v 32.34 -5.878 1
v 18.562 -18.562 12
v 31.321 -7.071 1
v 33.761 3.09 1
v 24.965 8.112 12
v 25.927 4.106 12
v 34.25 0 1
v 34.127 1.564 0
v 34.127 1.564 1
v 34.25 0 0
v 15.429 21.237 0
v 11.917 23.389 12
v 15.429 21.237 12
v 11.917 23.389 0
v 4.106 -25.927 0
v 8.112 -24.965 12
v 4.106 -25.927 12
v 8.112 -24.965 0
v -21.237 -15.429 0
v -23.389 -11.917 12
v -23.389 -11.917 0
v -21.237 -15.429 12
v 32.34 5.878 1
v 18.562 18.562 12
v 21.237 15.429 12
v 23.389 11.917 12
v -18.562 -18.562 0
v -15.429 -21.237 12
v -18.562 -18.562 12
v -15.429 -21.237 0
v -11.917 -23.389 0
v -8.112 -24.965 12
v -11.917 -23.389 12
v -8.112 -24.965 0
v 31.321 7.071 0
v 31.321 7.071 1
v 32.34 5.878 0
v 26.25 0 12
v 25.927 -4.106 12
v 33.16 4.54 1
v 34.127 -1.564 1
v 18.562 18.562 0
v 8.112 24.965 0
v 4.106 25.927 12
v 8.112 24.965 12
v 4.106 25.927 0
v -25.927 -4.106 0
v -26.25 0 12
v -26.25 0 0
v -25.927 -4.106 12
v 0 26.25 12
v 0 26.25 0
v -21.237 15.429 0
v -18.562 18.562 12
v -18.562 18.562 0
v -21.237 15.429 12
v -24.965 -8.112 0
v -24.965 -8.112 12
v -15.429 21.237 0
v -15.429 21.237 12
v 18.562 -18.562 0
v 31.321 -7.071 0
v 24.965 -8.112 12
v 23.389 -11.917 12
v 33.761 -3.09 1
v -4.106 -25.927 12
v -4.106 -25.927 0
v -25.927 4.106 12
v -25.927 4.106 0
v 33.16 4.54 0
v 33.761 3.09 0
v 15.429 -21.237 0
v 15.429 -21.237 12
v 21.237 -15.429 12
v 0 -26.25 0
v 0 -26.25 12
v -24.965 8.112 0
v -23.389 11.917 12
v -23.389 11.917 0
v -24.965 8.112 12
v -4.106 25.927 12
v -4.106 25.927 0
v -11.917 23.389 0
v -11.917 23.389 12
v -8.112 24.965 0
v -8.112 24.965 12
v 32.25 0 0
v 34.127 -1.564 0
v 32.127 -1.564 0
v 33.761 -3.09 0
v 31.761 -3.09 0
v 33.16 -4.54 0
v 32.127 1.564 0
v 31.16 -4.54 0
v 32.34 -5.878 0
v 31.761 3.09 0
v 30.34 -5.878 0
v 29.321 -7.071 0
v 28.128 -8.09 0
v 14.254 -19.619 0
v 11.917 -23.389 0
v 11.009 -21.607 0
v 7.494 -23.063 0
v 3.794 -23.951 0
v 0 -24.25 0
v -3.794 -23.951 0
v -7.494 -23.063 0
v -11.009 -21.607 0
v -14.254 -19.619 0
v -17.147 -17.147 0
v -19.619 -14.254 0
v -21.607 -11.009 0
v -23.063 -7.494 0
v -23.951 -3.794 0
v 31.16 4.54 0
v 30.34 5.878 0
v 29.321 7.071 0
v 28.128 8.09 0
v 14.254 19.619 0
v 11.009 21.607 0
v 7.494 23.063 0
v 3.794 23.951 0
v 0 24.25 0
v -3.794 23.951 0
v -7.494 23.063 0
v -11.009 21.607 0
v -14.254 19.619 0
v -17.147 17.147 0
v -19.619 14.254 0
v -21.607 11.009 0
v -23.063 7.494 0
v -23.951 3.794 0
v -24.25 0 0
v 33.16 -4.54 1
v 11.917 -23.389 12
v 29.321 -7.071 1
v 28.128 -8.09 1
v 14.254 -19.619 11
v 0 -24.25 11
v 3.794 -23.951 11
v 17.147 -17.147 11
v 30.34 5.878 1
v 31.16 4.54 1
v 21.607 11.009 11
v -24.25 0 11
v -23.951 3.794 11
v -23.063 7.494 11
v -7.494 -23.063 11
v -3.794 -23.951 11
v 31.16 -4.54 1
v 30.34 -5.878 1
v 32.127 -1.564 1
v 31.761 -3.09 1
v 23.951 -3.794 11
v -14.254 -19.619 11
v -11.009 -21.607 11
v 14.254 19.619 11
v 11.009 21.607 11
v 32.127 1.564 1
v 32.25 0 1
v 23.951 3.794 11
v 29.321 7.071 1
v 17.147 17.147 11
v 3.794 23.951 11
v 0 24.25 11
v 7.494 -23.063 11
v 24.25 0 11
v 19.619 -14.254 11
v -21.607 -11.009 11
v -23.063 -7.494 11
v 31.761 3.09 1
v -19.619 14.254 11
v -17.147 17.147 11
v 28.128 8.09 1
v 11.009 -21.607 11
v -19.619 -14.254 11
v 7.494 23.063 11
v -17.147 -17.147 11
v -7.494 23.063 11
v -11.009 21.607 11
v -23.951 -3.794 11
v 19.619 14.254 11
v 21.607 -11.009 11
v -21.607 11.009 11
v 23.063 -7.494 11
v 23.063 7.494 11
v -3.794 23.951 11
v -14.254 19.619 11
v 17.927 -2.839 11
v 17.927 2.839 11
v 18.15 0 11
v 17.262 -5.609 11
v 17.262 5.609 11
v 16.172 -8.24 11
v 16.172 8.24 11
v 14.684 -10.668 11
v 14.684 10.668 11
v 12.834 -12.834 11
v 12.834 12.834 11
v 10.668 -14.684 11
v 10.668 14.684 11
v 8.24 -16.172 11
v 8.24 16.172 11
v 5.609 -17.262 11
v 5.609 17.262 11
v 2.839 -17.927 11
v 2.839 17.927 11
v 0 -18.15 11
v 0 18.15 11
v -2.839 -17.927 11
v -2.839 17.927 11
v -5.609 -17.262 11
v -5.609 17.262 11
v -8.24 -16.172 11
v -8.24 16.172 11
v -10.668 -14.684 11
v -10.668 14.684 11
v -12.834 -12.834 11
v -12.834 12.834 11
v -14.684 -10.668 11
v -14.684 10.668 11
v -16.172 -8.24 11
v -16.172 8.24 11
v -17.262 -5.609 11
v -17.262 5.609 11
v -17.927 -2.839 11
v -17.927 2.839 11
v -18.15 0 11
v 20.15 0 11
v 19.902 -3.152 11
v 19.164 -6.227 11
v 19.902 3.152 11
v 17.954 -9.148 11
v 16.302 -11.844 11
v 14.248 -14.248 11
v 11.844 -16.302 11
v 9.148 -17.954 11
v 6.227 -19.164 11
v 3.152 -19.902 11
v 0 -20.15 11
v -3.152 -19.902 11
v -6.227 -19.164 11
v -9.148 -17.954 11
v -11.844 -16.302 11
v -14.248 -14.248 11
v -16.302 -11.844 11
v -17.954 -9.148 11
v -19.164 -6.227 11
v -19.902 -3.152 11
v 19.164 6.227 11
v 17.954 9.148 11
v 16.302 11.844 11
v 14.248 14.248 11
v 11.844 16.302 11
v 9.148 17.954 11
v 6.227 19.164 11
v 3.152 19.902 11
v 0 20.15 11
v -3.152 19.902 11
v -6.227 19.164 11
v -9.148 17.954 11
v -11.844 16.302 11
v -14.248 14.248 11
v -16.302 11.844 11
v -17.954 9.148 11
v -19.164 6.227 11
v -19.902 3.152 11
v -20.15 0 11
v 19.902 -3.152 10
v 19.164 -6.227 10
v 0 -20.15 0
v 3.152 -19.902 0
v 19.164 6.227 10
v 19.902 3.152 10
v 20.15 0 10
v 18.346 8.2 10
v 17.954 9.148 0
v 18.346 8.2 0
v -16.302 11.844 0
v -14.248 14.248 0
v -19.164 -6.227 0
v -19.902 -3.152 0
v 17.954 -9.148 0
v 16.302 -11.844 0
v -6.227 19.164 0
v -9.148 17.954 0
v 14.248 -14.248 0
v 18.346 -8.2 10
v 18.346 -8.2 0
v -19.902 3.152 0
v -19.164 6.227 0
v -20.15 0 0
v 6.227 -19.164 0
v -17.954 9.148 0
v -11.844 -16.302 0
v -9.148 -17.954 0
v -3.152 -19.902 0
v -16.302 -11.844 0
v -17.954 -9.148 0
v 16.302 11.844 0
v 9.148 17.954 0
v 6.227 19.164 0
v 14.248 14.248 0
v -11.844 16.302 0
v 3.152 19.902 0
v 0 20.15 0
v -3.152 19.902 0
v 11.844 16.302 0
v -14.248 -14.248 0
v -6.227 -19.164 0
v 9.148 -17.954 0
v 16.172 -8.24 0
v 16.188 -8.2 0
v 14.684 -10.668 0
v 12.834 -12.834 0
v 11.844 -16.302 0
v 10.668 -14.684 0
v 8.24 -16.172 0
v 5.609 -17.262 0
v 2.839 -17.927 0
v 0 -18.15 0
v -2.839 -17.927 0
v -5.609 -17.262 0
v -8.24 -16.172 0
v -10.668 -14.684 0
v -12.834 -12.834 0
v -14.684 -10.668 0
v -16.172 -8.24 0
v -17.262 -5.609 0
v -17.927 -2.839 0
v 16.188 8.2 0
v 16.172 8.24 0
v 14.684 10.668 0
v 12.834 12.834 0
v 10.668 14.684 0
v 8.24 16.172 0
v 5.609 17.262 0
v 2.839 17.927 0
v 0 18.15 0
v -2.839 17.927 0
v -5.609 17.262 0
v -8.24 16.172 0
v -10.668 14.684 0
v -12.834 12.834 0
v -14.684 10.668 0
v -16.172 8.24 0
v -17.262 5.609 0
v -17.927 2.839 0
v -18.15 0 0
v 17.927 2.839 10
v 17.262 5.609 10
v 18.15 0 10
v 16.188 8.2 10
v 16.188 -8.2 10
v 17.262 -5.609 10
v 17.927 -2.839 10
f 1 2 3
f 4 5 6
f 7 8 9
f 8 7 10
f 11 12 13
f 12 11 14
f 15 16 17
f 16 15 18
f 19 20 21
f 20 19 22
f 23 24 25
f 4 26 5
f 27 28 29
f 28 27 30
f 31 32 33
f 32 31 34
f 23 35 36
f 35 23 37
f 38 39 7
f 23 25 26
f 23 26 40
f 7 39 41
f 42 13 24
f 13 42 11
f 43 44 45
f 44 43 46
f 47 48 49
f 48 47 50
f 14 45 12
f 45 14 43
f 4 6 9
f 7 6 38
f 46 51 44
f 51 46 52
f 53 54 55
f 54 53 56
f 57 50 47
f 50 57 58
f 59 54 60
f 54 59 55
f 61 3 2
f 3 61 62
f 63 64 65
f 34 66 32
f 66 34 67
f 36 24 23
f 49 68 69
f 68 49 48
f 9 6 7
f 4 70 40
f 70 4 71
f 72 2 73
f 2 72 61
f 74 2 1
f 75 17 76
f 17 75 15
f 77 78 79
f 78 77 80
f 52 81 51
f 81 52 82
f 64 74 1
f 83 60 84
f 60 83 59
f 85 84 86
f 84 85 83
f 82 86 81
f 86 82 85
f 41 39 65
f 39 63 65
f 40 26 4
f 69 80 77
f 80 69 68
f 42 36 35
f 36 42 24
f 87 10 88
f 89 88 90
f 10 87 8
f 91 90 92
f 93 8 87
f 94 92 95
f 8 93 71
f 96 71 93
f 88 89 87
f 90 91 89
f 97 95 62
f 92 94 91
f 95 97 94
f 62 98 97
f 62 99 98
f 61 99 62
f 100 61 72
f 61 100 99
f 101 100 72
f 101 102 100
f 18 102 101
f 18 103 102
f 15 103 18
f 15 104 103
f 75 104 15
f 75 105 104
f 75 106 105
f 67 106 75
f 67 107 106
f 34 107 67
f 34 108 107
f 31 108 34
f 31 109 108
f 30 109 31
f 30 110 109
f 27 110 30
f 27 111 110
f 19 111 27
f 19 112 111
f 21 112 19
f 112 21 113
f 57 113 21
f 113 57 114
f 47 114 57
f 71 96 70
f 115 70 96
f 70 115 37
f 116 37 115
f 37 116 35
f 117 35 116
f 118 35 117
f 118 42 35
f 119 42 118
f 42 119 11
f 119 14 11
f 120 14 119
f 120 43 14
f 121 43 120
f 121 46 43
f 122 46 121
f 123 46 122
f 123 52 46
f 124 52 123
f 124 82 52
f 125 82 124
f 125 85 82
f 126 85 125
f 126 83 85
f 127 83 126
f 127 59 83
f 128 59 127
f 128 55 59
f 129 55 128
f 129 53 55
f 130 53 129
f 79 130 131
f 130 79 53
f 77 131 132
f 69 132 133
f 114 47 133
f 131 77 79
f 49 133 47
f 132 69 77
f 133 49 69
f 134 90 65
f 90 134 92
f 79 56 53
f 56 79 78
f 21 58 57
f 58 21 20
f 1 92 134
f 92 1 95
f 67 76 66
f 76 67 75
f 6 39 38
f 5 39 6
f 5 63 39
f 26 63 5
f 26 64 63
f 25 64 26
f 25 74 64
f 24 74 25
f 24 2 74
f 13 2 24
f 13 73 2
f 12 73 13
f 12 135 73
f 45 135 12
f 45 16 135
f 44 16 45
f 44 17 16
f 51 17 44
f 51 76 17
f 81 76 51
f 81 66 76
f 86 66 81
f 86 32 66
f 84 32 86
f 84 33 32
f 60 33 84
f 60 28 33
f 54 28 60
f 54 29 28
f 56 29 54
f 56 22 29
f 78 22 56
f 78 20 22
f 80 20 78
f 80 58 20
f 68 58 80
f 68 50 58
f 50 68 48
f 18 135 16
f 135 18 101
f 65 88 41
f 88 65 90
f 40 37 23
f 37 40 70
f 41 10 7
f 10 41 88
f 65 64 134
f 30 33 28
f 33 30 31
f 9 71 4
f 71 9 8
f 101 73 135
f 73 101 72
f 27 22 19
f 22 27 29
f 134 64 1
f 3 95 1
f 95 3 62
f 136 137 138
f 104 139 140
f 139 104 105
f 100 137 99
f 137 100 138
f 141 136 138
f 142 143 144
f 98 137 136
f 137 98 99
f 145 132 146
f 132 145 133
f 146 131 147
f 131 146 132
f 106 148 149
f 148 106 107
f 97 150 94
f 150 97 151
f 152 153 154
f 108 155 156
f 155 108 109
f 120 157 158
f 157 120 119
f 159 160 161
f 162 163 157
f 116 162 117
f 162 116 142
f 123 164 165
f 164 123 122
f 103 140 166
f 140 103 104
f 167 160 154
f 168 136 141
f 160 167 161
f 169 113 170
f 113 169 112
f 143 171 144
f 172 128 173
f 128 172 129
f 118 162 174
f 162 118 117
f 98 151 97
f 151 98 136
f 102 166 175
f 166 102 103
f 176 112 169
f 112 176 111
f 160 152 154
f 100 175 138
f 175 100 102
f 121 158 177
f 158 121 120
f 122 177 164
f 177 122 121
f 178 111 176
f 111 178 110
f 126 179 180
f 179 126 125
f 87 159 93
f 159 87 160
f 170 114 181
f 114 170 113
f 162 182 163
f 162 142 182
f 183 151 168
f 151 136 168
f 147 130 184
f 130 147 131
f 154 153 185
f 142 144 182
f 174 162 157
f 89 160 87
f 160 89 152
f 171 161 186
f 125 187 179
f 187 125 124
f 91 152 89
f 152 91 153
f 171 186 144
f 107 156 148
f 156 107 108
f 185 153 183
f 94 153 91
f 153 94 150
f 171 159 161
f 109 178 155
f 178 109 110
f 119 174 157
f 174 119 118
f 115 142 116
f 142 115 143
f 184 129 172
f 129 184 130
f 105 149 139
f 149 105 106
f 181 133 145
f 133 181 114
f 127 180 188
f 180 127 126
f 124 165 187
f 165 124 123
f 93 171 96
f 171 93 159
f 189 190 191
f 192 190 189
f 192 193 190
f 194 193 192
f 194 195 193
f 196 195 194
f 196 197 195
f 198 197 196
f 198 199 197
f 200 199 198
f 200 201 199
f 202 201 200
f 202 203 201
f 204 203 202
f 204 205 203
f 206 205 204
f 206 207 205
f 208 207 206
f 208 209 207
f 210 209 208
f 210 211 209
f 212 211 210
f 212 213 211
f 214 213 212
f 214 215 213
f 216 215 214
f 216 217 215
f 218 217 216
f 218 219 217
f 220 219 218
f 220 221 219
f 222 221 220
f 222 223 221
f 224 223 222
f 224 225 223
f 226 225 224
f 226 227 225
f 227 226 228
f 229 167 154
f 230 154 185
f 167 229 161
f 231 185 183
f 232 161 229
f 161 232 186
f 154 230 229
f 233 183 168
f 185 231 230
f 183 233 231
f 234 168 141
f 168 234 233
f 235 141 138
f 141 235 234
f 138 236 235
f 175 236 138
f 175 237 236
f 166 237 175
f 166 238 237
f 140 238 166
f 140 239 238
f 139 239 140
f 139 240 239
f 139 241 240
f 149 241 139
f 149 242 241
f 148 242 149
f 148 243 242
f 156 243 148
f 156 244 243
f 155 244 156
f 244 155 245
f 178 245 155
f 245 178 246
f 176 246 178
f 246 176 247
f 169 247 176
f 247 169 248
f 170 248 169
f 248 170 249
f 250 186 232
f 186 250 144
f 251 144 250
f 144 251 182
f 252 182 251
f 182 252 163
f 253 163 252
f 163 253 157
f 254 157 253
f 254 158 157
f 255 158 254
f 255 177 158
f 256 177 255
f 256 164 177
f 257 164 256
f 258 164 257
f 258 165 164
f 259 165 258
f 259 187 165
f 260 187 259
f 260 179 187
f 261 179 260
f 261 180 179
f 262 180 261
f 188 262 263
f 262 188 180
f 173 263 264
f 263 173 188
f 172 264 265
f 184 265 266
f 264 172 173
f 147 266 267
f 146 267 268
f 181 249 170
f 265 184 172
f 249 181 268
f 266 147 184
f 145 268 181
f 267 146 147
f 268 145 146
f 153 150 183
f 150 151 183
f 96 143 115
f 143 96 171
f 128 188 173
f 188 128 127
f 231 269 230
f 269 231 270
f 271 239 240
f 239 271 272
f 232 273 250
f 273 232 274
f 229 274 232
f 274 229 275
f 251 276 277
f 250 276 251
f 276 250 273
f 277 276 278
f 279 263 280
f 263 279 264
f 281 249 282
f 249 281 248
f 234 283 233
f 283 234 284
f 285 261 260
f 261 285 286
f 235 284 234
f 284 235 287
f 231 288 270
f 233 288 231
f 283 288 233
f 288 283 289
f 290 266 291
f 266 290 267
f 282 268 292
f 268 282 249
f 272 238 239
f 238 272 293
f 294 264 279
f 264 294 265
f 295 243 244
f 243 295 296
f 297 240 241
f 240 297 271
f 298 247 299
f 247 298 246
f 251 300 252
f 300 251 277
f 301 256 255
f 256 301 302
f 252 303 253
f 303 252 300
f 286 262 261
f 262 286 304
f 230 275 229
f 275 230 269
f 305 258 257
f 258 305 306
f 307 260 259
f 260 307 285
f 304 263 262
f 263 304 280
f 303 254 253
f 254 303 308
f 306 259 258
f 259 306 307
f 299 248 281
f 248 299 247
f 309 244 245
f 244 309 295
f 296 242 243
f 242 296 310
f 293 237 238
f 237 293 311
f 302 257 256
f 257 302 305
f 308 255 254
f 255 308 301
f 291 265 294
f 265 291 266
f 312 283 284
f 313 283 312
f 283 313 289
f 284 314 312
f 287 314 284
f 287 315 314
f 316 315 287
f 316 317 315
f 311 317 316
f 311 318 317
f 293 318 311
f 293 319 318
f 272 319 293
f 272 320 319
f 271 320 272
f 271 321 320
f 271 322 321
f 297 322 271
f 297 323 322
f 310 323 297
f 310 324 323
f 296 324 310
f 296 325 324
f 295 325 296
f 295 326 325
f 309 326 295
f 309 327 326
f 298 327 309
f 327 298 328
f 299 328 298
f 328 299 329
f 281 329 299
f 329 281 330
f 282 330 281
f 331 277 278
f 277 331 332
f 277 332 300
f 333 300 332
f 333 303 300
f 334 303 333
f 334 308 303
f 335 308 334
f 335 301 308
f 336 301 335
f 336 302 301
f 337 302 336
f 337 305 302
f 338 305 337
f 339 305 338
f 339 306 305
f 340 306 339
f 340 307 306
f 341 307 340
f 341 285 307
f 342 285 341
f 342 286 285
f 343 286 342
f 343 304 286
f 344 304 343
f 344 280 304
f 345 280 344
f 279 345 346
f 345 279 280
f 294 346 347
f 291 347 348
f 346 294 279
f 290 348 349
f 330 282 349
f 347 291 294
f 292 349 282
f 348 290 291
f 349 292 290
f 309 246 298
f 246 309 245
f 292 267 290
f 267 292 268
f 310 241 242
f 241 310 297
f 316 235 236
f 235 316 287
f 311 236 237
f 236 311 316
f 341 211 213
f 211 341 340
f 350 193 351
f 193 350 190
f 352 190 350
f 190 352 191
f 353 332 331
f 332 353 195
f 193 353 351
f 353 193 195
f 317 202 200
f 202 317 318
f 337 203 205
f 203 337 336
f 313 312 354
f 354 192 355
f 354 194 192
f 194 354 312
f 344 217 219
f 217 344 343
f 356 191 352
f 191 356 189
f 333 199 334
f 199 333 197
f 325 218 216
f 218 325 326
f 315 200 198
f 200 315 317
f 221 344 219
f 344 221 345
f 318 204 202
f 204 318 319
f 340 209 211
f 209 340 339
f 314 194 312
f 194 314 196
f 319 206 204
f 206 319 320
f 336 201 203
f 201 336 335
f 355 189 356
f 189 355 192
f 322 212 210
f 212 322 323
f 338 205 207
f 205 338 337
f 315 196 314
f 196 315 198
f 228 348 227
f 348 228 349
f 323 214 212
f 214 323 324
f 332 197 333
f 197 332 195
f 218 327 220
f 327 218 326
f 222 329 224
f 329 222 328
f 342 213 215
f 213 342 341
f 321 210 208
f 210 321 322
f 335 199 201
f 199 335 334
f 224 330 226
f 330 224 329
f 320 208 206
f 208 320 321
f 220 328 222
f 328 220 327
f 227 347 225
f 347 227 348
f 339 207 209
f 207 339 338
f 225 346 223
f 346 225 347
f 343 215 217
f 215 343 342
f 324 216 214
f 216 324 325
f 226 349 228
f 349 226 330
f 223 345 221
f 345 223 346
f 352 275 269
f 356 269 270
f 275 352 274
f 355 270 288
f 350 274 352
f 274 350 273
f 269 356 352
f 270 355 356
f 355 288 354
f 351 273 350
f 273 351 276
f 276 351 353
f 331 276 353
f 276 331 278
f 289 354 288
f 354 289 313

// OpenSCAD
// Antenna tube End
// (c) g3org

//antenna tube 
tube_outer=48.5;

//wall
tube_wall=4.1;

//material between sectors
material_wall=2;

//object height
height=10;

//frint hole
hole=20;


$fn=40*1;




//Aussenkontur
module aussenkontur(){
	hull(){
		cylinder(r=tube_outer/2+material_wall,h=1);
		translate([tube_outer/2,0,0]) cylinder(r=hole/2,h=1);
		translate([0,0,height+1]) cylinder(r=tube_outer/2+material_wall,h=1);
	}

}

module innenkontur(){
	hull(){
		cylinder(r=tube_outer/2,h=1);
		translate([tube_outer/2-material_wall,0,0]) cylinder(r=hole/2,h=1);
		translate([0,0,height]) cylinder(r=tube_outer/2,h=1);
	}

}


module inlay(){
difference(){
		cylinder(r=tube_outer/2-tube_wall,h=height+1);	
		cylinder(r=tube_outer/2-tube_wall-material_wall,h=height+1);
		}
}

module topside(){
		translate([0,0,height-material_wall]){
			cylinder(r=tube_outer/2,h=material_wall);	
		}

}
module durchbruch(){
	translate([material_wall,0,+height/2]){
		cube ([tube_outer-2*tube_wall-2*material_wall,4*tube_wall,height],center=true);
	}

}



difference(){
	aussenkontur();
	innenkontur();
}

difference(){
	inlay();
	durchbruch();
}
//topside();
//durchbruch();

//testtube();



module testtube(){
	difference(){
		cylinder(r=tube_outer/2,h=2*height);	
		cylinder(r=tube_outer/2-tube_wall,h=2*height);	
	}
}
